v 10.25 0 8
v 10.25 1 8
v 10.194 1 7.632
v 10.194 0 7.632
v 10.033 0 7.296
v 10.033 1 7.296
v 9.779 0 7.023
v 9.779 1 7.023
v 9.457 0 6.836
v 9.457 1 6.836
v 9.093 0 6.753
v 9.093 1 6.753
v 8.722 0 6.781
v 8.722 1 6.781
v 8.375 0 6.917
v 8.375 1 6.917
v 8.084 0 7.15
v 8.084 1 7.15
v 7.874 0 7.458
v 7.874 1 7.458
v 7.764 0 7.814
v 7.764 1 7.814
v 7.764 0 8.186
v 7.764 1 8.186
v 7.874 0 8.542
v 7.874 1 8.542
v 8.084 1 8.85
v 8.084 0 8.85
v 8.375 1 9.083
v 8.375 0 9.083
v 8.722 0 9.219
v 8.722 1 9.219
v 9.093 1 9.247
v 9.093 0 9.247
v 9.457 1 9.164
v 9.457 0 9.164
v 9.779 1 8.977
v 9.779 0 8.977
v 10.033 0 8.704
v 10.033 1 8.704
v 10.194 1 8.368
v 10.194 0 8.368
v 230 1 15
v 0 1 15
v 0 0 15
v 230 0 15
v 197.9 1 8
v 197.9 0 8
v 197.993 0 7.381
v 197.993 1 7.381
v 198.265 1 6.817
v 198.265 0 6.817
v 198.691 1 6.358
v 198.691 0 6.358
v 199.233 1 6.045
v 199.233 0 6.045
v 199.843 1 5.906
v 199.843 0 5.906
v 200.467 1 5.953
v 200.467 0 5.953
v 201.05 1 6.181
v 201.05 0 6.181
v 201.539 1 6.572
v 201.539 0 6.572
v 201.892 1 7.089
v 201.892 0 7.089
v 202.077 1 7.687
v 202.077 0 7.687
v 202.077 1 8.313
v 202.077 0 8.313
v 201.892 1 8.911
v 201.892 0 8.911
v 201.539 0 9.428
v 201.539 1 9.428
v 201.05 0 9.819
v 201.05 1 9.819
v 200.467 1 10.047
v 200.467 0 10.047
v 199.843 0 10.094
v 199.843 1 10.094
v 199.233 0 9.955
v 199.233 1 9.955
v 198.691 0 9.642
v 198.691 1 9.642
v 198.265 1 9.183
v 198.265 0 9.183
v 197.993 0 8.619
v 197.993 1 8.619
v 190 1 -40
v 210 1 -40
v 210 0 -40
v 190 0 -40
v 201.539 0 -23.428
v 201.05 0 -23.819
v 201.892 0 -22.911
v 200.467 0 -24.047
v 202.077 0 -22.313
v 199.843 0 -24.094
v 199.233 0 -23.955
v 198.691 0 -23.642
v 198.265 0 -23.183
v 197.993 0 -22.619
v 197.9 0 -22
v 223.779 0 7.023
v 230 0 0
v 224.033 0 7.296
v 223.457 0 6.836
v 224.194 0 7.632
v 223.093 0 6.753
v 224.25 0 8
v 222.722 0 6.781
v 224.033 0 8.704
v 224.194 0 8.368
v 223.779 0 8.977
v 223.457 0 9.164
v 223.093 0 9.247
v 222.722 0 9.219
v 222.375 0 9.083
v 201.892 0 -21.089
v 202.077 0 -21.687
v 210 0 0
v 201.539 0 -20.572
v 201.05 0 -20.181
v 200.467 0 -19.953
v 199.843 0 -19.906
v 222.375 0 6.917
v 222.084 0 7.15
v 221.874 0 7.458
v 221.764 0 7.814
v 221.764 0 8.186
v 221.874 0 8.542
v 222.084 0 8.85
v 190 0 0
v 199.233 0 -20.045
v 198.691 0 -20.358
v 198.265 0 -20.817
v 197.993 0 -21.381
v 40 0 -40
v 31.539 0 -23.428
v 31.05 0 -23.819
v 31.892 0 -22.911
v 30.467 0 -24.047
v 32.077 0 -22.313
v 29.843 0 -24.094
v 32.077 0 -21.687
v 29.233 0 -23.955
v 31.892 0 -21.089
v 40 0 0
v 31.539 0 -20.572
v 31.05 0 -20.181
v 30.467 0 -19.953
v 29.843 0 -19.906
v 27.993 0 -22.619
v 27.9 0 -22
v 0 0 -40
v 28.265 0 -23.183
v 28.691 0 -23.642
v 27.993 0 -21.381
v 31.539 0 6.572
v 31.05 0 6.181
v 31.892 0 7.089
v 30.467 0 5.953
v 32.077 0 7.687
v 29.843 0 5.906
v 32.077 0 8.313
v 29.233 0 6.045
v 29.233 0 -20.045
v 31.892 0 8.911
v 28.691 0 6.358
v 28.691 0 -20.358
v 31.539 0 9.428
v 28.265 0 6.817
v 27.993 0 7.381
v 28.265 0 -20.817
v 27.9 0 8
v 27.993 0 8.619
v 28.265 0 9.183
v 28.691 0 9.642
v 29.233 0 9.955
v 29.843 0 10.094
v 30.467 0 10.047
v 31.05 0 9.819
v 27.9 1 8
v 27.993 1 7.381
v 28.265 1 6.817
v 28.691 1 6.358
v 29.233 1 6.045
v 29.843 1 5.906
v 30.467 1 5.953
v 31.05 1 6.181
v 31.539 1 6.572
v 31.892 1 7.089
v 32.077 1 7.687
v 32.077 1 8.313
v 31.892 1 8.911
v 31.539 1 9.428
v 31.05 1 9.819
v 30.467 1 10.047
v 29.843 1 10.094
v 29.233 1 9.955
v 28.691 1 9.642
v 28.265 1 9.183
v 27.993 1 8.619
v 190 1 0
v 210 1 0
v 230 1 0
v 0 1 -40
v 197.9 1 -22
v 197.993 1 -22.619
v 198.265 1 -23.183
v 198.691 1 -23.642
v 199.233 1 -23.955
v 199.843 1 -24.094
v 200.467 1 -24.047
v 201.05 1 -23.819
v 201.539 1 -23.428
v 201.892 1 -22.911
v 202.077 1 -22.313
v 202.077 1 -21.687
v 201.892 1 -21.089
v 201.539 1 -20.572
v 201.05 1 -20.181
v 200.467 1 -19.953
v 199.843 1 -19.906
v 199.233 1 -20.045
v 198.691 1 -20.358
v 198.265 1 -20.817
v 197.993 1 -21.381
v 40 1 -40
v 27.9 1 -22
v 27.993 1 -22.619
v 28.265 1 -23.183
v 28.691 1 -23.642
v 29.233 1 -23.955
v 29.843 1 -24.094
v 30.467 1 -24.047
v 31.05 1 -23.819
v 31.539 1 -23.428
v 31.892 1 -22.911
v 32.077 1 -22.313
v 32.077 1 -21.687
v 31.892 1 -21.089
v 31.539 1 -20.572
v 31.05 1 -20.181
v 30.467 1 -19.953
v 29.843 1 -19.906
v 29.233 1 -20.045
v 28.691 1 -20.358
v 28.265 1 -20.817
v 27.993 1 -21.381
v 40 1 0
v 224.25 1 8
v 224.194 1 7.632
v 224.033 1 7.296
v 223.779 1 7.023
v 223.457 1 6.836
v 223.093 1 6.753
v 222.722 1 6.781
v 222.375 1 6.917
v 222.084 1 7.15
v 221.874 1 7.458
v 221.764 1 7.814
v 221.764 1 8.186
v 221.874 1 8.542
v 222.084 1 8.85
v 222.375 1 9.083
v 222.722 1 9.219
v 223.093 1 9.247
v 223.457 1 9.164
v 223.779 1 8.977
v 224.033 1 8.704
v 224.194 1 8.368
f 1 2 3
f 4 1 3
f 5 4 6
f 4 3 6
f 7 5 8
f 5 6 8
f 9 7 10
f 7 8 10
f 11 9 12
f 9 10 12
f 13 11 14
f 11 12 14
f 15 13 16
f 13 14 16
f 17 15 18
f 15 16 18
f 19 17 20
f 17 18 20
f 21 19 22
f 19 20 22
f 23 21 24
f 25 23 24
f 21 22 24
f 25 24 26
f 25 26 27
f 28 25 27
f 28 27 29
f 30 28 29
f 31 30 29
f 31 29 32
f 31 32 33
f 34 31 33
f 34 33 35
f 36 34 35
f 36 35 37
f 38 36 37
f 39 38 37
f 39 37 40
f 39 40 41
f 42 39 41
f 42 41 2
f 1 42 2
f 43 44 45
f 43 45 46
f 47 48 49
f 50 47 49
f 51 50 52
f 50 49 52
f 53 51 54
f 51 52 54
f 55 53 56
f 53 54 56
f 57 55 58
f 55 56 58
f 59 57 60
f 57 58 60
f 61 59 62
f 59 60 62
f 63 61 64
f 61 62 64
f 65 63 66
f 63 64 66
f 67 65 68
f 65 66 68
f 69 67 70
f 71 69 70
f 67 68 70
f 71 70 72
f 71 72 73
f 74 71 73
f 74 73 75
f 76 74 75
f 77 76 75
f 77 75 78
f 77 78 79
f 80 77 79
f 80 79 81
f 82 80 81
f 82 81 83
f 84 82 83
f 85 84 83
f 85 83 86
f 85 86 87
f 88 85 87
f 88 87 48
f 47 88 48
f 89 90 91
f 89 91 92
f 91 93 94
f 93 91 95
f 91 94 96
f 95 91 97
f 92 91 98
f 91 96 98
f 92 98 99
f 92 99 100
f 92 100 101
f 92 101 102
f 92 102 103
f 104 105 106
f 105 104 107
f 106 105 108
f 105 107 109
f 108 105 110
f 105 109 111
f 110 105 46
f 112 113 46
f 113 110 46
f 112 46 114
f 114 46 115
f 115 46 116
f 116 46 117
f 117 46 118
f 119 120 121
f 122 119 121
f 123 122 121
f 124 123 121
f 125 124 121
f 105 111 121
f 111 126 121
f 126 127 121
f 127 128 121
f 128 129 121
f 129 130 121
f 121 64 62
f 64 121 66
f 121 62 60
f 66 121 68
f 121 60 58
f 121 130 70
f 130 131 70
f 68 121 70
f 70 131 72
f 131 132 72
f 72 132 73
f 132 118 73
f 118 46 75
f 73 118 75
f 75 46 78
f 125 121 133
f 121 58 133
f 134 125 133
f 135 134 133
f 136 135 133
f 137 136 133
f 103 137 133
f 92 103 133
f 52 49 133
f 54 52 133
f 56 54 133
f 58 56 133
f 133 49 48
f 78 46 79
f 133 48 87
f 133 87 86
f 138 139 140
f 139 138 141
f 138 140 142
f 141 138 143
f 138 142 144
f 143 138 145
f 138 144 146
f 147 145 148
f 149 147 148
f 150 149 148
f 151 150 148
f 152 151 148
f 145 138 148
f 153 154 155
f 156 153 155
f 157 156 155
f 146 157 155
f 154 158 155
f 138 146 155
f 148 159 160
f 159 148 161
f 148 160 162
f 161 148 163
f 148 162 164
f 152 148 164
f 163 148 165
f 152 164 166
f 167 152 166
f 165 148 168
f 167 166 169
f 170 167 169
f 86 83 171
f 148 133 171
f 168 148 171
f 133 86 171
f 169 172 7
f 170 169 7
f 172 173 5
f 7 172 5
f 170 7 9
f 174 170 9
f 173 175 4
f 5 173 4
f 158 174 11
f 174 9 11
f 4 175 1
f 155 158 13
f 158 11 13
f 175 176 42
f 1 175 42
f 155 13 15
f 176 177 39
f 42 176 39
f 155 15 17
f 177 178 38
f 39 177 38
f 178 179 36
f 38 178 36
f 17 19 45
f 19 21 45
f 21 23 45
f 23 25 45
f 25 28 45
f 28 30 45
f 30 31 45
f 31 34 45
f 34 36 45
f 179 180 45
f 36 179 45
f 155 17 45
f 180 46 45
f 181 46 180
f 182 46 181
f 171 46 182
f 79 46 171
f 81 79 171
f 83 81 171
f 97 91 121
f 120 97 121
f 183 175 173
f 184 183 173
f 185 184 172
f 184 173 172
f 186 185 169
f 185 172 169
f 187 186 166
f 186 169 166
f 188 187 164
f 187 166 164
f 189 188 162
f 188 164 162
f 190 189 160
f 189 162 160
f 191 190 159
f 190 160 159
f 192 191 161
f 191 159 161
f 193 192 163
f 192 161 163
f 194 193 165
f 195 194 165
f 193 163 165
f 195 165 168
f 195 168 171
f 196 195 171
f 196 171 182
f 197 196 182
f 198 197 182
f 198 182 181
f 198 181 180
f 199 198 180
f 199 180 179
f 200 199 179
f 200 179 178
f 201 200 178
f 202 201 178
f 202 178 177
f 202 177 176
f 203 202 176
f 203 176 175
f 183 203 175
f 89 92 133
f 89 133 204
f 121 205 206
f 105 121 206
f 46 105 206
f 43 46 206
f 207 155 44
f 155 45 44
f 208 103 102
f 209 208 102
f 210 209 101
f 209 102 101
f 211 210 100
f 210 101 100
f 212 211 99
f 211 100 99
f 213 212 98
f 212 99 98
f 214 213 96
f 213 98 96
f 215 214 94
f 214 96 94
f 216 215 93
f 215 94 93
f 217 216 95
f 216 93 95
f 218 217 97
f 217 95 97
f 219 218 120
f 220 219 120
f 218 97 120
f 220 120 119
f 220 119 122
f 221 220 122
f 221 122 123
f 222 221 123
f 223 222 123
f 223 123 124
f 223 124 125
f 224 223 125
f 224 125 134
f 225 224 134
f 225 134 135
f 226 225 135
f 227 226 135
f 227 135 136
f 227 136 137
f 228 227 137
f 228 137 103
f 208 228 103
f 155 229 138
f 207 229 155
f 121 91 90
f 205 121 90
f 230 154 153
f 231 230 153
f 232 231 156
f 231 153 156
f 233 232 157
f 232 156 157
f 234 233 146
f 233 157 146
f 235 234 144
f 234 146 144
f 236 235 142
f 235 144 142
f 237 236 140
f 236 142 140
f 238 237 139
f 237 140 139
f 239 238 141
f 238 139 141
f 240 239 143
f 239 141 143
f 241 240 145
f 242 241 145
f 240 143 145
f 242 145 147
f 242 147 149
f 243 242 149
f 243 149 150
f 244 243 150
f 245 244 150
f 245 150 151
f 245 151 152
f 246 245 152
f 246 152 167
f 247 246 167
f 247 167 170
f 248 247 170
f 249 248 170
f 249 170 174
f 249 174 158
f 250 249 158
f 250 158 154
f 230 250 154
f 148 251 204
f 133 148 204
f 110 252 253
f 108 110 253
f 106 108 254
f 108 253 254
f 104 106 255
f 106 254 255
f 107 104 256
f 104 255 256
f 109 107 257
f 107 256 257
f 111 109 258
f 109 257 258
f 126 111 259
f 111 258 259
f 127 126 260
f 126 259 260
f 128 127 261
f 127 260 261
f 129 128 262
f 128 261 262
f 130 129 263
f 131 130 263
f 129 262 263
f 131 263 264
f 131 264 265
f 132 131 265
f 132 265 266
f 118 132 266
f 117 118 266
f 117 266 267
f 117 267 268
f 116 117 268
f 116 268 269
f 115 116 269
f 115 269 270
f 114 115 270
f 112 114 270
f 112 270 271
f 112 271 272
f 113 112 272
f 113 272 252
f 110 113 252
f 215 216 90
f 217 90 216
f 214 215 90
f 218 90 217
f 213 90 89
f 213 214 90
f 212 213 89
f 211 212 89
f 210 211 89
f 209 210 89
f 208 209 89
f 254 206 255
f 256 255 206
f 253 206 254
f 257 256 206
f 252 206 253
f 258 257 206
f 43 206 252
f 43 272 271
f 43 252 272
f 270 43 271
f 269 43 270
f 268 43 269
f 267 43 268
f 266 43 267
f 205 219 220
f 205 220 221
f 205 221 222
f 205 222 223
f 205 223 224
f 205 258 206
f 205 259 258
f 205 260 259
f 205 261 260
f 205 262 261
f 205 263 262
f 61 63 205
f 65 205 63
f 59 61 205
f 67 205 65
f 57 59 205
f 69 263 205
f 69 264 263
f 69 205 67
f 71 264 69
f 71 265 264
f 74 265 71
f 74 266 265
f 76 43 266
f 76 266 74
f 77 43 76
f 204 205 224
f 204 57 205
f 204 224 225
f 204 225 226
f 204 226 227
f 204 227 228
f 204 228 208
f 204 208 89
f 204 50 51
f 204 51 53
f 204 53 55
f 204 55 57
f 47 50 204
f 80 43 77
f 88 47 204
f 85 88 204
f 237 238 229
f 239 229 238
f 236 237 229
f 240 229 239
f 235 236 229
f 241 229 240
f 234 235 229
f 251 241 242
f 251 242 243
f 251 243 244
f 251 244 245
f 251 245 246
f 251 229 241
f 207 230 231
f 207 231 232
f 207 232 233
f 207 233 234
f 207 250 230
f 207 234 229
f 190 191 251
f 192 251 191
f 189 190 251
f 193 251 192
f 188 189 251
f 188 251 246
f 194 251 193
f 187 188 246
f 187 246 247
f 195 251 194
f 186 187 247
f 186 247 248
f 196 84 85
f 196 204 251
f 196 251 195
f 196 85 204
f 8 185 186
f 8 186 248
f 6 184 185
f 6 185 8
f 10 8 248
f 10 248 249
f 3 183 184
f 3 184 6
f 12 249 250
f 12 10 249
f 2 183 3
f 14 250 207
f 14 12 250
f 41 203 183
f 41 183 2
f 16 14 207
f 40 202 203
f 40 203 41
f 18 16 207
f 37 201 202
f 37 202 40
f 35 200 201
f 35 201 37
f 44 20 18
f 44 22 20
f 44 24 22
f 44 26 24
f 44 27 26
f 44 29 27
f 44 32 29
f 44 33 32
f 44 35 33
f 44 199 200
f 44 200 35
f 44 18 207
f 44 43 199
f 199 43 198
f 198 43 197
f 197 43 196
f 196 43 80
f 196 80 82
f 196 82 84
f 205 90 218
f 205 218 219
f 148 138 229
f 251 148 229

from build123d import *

# Parameters (mm, degrees)
SKETCH_1_W      = 230
SKETCH_1_H      = 1
EXTRUDE_1_DEPTH = 15
M3X0_5_1_D      = 2.5
M5X0_8_1_D      = 4.2
SKETCH_10_W     = 20
SKETCH_10_H     = 1
EXTRUDE_3_DEPTH = 40
SKETCH_11_W     = 40
SKETCH_11_H     = 1
EXTRUDE_4_DEPTH = 40
M5X0_8_3_D      = 4.2


with BuildPart() as part:
    # ｽｹｯﾁ1 → ﾎﾞｽ - 押し出し1 (new body)
    with BuildSketch(Plane.XY):
        with Locations((115, 0.5)):
            Rectangle(SKETCH_1_W, SKETCH_1_H)
    extrude(amount=EXTRUDE_1_DEPTH)

    # M3x0.5 ねじ穴1 (through all)
    with Locations(Plane(origin=(0, 0, 0), x_dir=(-1, 0, 0), z_dir=(0, -1, 0))):
        with Locations((-9, -8), (-223, -8)):
            Hole(M3X0_5_1_D / 2)

    # M5x0.8 ねじ穴1 (through all)
    with Locations(Plane(origin=(0, 1, 0), x_dir=(1, 0, 0), z_dir=(0, 1, 0))):
        with Locations((30, -8), (200, -8)):
            Hole(M5X0_8_1_D / 2)

    # ｽｹｯﾁ10 → ﾎﾞｽ - 押し出し3 (add)
    with BuildSketch(Plane(origin=(0, 0, 0), x_dir=(-1, 0, 0), z_dir=(0, 0, -1))):
        with Locations((-200, 0.5)):
            Rectangle(SKETCH_10_W, SKETCH_10_H)
    extrude(amount=EXTRUDE_3_DEPTH)

    # ｽｹｯﾁ11 → ﾎﾞｽ - 押し出し4 (add)
    with BuildSketch(Plane(origin=(0, 0, 0), x_dir=(-1, 0, 0), z_dir=(0, 0, -1))):
        with Locations((-20, 0.5)):
            Rectangle(SKETCH_11_W, SKETCH_11_H)
    extrude(amount=EXTRUDE_4_DEPTH)

    # M5x0.8 ねじ穴3 (through all)
    with Locations(Plane(origin=(0, 1, 0), x_dir=(1, 0, 0), z_dir=(0, 1, 0))):
        with Locations((30, 22), (200, 22)):
            Hole(M5X0_8_3_D / 2)


solid = part.part
